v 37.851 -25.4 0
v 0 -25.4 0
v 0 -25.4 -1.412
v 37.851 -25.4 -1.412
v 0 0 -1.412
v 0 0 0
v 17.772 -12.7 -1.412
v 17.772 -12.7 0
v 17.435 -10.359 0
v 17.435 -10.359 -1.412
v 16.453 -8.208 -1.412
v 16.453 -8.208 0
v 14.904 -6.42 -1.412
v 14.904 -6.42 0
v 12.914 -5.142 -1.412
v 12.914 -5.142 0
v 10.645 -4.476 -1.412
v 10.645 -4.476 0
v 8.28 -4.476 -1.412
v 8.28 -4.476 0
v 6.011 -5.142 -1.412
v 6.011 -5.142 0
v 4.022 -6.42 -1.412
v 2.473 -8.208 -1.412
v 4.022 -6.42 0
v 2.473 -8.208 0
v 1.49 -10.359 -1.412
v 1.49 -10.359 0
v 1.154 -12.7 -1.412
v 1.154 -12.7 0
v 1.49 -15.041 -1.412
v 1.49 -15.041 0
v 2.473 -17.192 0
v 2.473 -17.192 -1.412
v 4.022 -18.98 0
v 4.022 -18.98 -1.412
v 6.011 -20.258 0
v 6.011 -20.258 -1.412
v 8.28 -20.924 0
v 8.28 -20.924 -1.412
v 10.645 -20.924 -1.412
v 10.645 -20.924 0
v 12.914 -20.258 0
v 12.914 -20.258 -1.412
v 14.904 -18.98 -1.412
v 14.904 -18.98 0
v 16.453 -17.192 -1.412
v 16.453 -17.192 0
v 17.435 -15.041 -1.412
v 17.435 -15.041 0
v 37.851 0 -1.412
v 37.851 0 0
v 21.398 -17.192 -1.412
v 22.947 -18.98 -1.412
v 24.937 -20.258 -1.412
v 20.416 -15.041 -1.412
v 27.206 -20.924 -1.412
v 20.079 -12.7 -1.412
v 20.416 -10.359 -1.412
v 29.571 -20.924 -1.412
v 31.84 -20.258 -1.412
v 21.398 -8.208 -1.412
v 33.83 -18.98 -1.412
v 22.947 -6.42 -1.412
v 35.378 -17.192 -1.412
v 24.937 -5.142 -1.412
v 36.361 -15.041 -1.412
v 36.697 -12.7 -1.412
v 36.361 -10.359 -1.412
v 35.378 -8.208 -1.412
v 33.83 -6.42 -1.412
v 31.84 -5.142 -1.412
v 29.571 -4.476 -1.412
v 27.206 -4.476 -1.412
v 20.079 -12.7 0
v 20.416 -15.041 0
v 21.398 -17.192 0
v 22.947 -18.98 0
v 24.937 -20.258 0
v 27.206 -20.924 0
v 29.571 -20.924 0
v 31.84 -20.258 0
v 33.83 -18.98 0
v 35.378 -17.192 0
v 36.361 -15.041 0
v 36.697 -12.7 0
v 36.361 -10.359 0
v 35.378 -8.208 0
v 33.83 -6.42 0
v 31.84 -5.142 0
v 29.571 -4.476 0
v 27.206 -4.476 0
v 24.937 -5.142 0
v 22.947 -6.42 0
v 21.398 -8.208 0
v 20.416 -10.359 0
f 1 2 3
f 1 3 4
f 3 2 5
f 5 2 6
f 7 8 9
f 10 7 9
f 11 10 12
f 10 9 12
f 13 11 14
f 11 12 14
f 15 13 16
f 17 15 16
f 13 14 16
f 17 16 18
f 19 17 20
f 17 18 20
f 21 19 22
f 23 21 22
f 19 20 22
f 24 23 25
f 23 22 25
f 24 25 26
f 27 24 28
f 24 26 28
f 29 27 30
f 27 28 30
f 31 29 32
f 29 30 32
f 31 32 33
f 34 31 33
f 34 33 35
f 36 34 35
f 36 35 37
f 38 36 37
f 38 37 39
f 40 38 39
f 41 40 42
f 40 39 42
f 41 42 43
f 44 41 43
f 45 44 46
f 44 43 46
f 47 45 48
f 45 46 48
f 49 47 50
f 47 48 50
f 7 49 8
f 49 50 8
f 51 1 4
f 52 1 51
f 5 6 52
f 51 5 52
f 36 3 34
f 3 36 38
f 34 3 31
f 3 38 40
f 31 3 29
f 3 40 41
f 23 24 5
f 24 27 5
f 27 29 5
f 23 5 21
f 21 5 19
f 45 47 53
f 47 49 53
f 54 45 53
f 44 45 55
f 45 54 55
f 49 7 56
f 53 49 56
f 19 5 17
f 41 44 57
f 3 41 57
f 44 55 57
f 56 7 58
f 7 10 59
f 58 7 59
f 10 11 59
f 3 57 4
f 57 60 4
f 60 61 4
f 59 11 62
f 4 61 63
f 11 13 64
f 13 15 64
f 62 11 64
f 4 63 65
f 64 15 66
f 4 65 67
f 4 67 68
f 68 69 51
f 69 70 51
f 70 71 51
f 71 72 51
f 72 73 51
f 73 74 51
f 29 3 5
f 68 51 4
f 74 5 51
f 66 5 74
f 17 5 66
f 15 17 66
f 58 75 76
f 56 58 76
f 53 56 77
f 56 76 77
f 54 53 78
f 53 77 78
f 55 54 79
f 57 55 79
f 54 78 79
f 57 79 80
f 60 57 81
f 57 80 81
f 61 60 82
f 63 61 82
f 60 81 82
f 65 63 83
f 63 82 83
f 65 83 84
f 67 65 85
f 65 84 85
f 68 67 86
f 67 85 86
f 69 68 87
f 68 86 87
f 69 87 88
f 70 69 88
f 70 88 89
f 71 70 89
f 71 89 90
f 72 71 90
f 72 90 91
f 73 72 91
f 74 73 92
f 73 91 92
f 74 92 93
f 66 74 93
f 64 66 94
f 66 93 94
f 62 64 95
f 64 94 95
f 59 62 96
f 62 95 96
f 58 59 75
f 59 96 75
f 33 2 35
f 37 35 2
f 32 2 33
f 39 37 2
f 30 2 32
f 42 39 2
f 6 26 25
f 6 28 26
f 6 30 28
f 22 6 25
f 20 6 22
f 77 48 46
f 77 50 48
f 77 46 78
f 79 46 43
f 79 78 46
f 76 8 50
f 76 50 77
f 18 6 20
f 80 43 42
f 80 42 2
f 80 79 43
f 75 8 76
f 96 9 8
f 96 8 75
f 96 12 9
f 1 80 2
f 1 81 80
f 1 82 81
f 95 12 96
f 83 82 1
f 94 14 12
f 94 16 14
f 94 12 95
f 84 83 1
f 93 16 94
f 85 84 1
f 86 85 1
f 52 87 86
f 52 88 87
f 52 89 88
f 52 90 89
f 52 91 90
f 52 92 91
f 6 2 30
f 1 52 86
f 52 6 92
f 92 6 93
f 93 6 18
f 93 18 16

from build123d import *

# Parameters (mm, degrees)
SKETCH1_W           = 37.85108
SKETCH1_H           = 25.4
SKETCH1_R           = 8.309045905
BOSS_EXTRUDE1_DEPTH = 1.41224


with BuildPart() as part:
    # Sketch1 → Boss-Extrude1 (new body)
    with BuildSketch(Plane.XY):
        with Locations((18.92554, -12.7)):
            Rectangle(SKETCH1_W, SKETCH1_H)
        with Locations((9.46277, -12.7)):
            Circle(SKETCH1_R, mode=Mode.SUBTRACT)
        with Locations(Location((28.38831, -12.7, 0), (0, 0, 180))):
            Circle(SKETCH1_R, mode=Mode.SUBTRACT)
    extrude(amount=-BOSS_EXTRUDE1_DEPTH)


solid = part.part
